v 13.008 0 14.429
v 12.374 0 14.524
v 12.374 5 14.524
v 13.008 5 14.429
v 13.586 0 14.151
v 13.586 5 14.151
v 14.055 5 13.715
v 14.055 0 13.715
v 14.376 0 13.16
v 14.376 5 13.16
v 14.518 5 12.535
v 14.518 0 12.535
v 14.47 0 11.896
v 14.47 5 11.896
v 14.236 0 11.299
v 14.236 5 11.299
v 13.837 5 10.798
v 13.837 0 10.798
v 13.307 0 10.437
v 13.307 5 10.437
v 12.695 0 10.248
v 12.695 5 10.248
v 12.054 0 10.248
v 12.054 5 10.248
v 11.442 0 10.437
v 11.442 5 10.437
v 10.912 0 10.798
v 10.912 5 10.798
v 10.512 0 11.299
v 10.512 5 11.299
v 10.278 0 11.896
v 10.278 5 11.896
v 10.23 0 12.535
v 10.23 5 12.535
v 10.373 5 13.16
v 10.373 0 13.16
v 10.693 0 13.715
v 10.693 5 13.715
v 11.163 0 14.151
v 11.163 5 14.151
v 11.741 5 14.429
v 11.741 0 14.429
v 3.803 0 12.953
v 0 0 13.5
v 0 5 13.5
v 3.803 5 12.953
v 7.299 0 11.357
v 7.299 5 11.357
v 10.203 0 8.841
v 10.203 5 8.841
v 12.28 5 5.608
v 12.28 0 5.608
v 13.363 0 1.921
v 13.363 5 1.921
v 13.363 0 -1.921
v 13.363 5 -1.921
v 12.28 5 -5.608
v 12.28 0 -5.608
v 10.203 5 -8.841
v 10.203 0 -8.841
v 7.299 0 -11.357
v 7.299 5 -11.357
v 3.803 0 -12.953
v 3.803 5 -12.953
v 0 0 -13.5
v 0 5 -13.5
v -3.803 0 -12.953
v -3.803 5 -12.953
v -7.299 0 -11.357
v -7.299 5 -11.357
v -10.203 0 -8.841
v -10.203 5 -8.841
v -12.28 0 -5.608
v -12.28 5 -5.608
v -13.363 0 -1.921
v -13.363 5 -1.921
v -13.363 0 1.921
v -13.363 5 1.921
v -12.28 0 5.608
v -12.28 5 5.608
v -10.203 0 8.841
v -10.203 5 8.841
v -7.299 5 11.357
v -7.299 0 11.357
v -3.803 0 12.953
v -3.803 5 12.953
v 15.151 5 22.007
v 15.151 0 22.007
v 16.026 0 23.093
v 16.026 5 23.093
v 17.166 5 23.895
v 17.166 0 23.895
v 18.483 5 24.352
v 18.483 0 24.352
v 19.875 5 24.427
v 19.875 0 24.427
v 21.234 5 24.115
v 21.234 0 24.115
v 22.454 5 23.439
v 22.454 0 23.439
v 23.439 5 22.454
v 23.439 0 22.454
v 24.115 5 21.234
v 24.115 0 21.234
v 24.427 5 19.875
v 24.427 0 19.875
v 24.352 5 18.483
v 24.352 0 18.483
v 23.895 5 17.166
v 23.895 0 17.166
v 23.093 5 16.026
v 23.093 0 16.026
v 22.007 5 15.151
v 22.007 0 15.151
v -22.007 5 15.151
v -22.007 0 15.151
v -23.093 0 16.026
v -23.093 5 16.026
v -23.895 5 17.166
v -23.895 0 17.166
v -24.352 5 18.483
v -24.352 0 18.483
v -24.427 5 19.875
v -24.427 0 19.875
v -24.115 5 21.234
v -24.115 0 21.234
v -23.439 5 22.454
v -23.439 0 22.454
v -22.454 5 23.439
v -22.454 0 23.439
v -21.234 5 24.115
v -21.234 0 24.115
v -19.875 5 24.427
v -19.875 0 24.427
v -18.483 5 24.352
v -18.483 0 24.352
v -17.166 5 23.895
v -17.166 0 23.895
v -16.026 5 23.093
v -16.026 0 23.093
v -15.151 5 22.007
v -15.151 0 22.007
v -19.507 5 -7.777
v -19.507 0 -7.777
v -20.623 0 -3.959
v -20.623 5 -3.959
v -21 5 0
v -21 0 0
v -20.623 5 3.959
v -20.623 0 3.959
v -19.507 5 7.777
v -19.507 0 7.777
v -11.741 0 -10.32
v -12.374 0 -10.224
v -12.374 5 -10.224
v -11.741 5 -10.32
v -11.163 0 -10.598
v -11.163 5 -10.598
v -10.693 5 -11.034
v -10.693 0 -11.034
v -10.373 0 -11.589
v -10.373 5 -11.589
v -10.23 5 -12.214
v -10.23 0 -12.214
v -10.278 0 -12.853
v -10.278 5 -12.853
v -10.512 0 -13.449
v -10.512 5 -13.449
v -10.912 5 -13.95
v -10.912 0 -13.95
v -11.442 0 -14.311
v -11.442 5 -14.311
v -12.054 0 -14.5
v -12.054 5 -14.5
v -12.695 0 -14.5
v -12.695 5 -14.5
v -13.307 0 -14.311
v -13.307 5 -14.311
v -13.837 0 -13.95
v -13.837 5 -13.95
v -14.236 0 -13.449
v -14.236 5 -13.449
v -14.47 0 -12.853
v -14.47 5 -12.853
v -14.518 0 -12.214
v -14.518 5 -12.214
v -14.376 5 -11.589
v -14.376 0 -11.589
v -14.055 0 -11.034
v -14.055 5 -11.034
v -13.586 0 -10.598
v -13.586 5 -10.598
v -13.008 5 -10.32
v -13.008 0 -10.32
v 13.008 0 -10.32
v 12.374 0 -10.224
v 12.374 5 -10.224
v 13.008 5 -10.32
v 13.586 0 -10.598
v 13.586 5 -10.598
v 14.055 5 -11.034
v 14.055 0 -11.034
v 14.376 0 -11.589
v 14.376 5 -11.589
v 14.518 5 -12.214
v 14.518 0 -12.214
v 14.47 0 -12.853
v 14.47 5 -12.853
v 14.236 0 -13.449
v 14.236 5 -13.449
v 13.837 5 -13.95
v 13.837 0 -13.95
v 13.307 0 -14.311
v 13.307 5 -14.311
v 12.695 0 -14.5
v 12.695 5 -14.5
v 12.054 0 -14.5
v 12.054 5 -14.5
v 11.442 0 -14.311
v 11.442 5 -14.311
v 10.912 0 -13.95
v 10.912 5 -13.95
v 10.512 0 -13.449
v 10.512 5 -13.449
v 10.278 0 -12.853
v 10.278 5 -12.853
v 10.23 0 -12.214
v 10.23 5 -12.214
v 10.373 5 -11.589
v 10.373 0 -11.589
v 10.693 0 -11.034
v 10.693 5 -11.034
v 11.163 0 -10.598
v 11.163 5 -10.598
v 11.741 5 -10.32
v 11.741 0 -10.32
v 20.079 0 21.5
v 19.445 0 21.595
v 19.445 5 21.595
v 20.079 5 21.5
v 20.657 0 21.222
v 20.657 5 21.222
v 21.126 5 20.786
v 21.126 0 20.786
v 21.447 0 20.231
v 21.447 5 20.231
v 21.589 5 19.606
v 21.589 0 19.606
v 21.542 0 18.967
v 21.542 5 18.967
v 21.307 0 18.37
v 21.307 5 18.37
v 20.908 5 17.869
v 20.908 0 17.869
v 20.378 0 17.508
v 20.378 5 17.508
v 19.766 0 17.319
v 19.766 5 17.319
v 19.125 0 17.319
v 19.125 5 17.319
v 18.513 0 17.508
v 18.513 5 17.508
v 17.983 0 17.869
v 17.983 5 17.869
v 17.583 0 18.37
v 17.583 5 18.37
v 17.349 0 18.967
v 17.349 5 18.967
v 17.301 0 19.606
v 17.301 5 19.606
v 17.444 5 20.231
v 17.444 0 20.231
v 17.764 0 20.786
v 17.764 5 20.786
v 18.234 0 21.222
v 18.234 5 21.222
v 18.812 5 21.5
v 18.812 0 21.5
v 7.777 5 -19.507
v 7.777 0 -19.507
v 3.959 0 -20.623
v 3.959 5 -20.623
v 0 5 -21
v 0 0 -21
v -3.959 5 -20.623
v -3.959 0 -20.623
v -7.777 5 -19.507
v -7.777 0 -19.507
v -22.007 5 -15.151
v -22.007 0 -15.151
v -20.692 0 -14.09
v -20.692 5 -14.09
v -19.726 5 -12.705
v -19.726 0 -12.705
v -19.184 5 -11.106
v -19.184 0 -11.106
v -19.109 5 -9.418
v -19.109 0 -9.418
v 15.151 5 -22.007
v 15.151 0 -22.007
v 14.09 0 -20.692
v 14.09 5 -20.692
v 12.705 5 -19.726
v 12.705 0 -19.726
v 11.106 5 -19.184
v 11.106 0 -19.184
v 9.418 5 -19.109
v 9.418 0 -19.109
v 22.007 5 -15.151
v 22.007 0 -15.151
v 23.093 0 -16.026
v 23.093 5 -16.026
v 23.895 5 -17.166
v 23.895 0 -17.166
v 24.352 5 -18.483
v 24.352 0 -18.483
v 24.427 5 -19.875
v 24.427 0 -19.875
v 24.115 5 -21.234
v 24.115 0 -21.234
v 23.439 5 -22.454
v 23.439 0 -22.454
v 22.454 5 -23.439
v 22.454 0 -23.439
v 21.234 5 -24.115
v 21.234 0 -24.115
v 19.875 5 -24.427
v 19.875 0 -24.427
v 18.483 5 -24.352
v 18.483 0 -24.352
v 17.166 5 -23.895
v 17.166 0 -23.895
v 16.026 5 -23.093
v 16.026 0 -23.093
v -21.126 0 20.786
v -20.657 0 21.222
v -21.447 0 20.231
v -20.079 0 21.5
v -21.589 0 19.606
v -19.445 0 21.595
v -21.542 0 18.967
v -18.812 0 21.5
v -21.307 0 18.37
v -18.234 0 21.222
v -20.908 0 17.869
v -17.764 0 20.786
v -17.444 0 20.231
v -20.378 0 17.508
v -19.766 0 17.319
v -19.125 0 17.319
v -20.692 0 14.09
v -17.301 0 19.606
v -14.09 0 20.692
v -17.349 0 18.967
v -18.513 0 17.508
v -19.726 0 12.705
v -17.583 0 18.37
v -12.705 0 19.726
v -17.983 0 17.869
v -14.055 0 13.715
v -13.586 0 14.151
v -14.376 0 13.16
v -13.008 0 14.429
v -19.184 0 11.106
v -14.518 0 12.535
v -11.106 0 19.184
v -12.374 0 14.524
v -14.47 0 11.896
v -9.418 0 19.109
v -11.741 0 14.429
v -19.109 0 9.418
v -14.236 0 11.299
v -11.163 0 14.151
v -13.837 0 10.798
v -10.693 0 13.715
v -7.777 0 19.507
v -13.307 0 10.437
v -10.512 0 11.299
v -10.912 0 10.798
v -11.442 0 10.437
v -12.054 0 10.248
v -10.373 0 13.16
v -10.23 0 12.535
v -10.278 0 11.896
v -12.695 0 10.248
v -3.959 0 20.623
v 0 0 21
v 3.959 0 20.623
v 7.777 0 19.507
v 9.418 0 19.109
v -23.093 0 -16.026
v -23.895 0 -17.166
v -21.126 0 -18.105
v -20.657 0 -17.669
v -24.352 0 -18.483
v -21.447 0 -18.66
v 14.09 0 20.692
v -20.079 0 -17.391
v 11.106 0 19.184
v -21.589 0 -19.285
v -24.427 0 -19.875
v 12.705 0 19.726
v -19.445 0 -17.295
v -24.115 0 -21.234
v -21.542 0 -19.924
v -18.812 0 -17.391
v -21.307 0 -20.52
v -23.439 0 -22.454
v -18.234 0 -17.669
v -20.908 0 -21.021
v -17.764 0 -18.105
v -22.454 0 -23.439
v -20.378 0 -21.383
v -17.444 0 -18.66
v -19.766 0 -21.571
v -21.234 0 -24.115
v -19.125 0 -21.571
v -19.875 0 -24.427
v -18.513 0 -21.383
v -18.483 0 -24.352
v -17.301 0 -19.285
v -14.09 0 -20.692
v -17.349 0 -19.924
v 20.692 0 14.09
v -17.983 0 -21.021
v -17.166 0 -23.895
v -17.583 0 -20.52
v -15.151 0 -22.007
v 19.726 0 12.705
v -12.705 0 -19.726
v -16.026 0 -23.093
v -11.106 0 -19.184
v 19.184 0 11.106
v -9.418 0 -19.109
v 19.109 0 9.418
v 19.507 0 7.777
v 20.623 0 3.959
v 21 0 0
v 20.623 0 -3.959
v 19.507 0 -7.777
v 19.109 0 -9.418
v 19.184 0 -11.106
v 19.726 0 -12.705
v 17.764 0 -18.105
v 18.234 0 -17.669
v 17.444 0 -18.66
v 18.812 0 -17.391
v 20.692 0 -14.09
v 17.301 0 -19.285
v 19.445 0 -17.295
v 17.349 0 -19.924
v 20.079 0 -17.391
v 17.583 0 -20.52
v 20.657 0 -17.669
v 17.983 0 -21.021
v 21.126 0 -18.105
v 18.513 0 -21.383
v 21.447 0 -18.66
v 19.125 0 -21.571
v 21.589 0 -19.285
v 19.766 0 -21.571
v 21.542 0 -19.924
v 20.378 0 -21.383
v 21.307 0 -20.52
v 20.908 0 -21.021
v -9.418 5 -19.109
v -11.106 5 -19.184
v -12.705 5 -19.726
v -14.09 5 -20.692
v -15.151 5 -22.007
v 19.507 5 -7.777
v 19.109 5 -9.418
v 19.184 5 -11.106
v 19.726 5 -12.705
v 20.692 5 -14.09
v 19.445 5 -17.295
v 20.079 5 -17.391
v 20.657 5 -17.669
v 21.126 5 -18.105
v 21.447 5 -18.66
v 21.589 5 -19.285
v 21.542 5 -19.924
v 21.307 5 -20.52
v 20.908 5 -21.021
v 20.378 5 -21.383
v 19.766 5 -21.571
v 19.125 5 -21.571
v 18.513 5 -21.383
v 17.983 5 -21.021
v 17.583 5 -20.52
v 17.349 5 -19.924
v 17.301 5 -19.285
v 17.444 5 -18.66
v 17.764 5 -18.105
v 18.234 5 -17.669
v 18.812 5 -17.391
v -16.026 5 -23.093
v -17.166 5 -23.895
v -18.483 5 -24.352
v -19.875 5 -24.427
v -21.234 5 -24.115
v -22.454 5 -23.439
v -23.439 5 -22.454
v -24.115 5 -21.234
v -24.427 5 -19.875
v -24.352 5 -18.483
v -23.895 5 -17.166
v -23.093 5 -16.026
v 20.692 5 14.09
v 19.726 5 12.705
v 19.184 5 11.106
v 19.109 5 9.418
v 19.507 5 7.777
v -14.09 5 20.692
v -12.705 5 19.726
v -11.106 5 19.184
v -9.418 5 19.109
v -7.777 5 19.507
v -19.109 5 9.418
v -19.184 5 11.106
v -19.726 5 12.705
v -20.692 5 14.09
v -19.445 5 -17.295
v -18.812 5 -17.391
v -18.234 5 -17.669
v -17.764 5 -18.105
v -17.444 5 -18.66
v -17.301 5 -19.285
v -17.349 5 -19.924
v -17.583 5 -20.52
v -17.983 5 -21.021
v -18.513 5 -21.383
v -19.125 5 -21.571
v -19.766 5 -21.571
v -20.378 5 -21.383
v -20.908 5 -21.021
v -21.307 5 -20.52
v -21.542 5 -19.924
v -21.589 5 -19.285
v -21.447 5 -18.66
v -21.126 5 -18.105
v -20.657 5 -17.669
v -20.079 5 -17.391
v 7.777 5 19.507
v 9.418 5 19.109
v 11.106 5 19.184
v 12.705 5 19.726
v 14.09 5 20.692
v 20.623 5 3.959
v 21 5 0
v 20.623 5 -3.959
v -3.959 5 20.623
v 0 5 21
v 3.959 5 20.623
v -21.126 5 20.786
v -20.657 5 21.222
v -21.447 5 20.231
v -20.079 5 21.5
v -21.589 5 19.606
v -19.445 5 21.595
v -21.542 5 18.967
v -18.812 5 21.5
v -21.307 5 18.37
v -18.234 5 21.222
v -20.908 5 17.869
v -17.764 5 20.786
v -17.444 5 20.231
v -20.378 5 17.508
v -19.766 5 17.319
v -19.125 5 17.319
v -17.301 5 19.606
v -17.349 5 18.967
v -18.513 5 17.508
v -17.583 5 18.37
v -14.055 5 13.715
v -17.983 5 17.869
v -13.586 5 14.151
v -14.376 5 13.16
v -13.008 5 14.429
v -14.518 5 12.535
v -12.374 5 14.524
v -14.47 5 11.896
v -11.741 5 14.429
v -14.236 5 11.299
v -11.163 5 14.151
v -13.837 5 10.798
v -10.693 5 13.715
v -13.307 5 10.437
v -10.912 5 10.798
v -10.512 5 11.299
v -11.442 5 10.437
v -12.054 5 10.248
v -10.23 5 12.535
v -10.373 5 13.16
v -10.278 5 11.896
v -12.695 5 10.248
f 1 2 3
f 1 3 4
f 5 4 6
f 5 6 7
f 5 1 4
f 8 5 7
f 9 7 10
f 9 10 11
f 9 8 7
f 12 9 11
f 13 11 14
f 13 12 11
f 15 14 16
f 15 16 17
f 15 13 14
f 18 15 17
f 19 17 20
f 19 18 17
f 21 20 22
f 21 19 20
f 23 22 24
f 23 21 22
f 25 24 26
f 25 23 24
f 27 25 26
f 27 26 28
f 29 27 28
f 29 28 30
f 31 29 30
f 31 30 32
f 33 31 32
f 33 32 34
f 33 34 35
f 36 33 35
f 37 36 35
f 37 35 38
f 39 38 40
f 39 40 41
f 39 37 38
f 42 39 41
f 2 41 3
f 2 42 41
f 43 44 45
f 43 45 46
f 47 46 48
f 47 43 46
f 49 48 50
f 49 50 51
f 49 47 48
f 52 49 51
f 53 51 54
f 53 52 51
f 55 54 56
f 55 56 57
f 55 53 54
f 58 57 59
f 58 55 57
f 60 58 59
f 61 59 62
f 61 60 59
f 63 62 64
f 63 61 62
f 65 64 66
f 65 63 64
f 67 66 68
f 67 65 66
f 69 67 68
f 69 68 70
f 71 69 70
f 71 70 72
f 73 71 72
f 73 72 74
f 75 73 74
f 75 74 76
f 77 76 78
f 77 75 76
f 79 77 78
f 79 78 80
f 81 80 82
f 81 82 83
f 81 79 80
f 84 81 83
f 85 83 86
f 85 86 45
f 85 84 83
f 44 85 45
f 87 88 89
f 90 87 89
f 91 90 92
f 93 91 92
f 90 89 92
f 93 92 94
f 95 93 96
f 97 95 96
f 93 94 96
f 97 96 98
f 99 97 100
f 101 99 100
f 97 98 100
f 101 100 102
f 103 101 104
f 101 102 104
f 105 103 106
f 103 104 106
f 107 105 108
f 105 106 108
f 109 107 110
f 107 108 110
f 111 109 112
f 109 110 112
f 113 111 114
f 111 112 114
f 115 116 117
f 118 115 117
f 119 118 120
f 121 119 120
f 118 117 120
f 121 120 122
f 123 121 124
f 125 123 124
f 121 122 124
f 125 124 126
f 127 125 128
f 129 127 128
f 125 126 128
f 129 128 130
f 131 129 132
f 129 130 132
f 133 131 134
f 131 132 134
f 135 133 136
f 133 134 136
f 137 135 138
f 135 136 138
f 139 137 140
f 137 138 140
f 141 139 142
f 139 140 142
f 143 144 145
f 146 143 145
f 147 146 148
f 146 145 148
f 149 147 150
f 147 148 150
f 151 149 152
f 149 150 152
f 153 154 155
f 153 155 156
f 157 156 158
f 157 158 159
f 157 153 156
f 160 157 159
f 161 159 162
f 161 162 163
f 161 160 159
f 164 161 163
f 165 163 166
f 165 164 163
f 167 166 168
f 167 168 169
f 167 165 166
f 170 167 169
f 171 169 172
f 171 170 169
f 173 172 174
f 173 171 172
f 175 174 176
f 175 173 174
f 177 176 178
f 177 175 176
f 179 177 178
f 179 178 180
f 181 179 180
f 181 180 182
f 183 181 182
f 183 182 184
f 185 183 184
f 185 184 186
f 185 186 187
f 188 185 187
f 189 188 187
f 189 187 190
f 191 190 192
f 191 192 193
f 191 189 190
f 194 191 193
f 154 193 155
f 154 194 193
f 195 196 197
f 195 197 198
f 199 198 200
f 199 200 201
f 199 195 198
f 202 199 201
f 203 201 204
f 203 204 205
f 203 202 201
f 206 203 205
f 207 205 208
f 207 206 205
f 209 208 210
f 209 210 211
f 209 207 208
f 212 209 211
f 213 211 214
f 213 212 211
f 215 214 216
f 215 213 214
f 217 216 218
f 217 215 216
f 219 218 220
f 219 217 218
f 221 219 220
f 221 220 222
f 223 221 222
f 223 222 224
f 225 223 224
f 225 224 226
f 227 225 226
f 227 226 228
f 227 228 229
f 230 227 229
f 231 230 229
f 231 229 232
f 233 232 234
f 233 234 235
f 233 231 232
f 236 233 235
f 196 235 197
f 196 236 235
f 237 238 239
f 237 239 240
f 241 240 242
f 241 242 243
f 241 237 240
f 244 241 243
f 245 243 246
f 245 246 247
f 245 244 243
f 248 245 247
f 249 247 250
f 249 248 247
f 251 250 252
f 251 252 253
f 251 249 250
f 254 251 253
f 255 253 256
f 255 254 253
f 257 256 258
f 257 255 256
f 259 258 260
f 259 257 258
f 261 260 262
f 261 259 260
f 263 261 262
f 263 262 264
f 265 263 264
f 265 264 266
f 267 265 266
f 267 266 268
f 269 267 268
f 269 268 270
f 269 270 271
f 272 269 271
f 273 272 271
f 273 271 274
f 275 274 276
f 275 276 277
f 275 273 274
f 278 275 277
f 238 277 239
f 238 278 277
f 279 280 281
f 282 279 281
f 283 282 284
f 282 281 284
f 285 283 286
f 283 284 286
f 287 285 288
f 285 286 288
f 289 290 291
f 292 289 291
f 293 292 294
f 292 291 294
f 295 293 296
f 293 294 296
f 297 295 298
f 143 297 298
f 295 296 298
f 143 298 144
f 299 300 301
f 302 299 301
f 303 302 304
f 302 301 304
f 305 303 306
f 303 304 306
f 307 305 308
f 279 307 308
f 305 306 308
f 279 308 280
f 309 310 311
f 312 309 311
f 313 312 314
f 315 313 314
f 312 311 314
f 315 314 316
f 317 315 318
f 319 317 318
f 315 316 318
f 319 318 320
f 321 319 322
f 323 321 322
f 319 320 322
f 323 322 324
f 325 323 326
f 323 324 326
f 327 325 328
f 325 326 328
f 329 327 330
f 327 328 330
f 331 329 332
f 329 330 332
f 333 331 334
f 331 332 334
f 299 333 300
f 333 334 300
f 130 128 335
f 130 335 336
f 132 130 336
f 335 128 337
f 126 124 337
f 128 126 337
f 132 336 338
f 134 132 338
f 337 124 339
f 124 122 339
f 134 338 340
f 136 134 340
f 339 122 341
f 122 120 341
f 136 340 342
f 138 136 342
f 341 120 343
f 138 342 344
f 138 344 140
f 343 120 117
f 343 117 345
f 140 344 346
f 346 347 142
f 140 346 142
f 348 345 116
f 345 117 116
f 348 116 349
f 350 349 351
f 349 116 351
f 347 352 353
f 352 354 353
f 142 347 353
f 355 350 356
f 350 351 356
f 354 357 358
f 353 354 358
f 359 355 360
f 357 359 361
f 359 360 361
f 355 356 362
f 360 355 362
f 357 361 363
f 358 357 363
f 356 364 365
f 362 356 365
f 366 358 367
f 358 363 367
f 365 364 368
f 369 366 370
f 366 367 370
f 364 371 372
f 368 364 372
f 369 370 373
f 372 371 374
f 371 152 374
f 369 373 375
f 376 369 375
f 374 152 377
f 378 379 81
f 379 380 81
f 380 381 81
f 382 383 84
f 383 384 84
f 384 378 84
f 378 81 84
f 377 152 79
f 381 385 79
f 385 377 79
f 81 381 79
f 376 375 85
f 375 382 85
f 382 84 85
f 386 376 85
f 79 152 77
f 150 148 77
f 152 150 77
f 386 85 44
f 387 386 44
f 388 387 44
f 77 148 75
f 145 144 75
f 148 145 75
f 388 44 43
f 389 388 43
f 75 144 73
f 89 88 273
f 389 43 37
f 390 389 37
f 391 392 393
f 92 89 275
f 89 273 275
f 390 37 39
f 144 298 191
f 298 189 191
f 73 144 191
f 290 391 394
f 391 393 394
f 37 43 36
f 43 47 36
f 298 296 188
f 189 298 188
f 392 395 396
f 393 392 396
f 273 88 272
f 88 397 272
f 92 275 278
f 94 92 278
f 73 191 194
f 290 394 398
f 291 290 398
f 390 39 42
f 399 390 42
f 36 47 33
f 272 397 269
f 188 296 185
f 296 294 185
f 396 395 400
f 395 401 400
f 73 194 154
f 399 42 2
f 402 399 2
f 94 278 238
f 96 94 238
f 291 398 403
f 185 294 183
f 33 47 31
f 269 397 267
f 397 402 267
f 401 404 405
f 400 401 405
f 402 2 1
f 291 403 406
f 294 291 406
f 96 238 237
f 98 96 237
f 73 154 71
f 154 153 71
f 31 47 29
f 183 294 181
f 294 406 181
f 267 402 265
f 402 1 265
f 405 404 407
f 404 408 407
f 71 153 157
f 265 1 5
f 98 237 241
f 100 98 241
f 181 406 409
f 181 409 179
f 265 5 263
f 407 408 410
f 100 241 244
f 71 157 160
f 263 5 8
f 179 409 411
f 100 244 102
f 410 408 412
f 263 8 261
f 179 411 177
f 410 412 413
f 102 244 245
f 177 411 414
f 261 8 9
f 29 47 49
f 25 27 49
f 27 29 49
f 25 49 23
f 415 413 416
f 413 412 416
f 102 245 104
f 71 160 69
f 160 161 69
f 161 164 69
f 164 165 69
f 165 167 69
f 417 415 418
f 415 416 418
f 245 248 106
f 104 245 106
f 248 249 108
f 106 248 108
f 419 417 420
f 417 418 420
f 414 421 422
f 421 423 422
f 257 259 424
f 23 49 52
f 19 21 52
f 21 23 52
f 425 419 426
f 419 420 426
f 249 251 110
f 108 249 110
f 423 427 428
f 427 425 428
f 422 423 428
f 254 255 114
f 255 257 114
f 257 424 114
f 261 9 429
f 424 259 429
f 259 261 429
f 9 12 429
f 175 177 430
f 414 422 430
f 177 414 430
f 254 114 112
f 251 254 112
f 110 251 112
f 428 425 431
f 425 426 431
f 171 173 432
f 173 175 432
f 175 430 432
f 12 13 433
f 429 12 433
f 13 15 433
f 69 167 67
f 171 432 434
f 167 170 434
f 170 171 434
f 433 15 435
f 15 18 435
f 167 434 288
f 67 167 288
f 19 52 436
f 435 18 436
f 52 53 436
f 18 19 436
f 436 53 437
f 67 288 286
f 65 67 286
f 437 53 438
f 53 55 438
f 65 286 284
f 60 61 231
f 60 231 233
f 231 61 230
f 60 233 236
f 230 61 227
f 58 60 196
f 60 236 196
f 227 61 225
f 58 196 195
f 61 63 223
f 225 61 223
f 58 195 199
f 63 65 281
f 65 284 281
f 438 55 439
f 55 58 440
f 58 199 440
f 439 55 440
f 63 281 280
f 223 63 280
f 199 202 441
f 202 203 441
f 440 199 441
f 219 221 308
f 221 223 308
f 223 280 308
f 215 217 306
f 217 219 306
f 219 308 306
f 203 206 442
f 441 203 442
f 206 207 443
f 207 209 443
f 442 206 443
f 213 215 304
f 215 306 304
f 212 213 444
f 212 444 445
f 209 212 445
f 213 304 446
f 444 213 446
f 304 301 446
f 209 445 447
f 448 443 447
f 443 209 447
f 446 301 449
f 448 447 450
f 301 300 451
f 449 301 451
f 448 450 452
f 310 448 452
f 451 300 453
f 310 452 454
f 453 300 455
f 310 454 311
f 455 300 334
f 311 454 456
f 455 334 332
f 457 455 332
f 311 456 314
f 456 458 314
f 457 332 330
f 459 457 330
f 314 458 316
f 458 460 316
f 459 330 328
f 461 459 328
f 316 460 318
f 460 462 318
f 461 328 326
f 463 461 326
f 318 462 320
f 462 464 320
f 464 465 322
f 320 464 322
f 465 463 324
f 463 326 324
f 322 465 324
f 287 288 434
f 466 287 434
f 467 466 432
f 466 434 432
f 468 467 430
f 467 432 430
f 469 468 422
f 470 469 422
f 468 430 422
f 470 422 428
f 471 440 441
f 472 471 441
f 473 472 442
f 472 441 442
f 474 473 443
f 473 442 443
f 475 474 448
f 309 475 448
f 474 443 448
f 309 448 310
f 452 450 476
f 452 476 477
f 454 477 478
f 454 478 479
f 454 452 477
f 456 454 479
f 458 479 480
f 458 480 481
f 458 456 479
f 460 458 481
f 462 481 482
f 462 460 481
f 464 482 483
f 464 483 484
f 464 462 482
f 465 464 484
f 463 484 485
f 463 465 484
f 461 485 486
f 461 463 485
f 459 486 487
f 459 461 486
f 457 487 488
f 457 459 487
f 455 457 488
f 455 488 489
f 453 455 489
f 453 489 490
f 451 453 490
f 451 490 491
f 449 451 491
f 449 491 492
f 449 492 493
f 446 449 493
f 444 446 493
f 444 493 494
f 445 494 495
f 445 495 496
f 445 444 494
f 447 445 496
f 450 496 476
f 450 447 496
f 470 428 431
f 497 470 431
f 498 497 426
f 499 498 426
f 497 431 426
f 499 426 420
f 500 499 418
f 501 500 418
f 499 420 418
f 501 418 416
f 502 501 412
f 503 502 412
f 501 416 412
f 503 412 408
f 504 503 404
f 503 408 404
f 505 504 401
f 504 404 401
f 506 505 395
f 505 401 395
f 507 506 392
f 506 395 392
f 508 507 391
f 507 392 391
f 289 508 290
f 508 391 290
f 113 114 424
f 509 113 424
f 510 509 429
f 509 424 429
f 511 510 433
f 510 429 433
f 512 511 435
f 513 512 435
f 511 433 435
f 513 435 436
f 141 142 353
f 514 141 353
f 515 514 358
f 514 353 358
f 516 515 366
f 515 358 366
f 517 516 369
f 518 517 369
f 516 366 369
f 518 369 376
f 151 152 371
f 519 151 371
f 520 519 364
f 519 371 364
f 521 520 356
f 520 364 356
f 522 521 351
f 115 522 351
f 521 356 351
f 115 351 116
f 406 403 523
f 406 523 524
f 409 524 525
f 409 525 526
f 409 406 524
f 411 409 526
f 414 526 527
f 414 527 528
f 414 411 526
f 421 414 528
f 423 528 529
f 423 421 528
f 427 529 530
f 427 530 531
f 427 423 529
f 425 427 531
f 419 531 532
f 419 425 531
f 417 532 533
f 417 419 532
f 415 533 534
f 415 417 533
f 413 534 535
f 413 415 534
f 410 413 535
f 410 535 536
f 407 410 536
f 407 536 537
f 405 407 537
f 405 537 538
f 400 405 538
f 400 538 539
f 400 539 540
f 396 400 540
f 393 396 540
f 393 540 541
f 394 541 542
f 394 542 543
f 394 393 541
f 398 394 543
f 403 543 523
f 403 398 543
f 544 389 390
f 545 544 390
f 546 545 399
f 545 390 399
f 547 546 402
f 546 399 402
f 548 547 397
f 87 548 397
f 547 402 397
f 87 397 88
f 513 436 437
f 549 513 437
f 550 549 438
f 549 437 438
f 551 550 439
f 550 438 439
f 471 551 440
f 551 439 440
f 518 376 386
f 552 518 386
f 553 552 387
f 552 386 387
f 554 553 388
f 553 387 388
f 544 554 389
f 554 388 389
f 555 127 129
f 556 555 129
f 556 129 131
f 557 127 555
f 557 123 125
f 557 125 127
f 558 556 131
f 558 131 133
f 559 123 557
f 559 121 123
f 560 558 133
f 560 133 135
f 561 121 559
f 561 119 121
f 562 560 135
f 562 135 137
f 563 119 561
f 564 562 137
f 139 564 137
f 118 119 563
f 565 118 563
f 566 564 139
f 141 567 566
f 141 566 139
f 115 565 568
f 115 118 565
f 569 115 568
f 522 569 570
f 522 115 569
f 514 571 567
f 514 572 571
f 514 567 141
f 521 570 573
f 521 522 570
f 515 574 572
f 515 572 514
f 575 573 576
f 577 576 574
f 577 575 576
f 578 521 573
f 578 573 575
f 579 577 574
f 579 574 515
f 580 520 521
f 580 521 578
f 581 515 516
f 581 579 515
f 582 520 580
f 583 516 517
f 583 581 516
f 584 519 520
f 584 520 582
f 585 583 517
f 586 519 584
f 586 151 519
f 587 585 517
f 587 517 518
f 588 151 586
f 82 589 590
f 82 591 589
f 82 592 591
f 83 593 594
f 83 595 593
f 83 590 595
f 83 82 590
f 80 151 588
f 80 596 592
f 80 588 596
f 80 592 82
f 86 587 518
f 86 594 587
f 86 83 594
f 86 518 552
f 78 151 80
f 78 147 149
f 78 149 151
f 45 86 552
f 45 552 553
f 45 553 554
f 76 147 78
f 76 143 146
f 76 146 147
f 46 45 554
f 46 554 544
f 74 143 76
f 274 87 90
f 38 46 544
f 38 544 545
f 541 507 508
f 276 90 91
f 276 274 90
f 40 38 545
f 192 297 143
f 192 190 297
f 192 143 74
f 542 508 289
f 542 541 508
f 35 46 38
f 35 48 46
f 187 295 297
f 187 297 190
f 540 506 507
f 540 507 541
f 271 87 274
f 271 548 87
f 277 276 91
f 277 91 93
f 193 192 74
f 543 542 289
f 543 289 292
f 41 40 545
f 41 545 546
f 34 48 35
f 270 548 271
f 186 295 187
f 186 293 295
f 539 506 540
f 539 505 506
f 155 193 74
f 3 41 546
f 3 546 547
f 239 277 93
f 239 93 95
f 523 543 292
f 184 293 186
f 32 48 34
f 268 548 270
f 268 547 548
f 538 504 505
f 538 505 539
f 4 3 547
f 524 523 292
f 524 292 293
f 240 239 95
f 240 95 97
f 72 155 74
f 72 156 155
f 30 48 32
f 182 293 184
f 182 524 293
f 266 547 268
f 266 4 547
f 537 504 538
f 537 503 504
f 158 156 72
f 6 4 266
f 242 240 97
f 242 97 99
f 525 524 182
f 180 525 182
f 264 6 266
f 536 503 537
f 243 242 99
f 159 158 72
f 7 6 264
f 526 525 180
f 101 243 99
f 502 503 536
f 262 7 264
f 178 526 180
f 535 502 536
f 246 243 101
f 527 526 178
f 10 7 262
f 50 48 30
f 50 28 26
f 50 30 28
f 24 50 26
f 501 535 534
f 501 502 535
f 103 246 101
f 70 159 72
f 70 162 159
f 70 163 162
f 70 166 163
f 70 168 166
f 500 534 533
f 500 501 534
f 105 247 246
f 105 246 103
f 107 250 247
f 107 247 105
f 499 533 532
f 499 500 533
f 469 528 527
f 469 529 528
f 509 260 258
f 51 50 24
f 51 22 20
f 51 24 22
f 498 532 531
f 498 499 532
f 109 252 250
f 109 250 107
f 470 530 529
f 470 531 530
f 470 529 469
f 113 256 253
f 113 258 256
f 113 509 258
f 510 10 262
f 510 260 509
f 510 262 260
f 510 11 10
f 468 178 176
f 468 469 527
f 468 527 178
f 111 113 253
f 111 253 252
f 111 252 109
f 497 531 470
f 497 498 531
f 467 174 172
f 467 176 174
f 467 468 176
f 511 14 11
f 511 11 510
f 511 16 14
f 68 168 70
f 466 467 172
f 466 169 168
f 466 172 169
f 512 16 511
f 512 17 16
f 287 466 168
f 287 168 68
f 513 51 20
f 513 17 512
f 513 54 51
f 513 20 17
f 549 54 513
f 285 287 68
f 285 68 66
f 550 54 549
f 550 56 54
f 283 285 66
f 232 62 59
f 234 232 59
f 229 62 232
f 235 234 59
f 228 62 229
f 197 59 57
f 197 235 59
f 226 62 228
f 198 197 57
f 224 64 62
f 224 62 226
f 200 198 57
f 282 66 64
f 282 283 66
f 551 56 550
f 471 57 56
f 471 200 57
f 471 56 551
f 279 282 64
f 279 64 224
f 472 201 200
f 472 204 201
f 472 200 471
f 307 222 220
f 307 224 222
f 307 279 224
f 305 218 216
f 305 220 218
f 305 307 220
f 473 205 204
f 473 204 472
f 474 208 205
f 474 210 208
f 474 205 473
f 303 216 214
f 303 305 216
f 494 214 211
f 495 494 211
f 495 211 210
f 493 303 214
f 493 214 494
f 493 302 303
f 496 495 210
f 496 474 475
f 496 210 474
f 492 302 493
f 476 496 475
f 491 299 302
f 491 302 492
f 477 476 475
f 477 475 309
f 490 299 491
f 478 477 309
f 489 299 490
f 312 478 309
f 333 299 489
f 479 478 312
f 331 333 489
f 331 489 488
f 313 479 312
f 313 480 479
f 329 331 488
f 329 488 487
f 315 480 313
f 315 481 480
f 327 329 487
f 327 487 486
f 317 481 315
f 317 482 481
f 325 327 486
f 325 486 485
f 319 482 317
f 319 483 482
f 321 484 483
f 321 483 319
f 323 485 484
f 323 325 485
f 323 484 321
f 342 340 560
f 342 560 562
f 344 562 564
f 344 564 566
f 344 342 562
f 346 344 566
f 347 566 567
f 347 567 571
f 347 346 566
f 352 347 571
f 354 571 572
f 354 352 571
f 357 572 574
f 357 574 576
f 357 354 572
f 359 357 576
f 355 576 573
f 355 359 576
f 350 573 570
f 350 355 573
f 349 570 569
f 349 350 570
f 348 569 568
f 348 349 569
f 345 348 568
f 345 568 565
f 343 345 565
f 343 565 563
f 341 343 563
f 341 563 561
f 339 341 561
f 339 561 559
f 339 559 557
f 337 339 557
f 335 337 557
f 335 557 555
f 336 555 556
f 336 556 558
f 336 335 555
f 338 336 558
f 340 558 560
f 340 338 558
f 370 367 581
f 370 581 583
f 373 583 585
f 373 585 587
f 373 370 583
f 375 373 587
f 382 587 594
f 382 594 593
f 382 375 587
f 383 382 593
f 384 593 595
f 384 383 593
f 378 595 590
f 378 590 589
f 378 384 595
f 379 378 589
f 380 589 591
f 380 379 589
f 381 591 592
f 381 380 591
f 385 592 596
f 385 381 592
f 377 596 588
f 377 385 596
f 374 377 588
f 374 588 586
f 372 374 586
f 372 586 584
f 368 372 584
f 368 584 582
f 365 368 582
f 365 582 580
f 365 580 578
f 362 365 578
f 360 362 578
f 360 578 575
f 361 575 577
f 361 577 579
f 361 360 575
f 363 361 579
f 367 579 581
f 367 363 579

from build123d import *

# Parameters (mm, degrees)
SKETCH_1_R      = 13.5
SKETCH_1_R_2    = 2.15
EXTRUDE_1_DEPTH = 5


with BuildPart() as part:
    # ｽｹｯﾁ1 → ﾎﾞｽ - 押し出し1 (new body)
    with BuildSketch(Plane(origin=(0, 0, 0), x_dir=(1, 0, 0), z_dir=(0, 1, 0))):
        with BuildLine():
            ThreePointArc((19.507056212, -7.776551803), (21, 0), (19.507056212, 7.776551803))
            ThreePointArc((19.507056212, 7.776551803), (19.398069264, 11.924552334), (22.006829374, 15.151339784))
            ThreePointArc((22.006829374, 15.151339784), (22.980970389, 22.980970389), (15.151339784, 22.006829374))
            ThreePointArc((15.151339784, 22.006829374), (11.924552334, 19.398069264), (7.776551803, 19.507056212))
            ThreePointArc((7.776551803, 19.507056212), (0, 21), (-7.776551803, 19.507056212))
            ThreePointArc((-7.776551803, 19.507056212), (-11.924552334, 19.398069264), (-15.151339784, 22.006829374))
            ThreePointArc((-15.151339784, 22.006829374), (-22.980970389, 22.980970389), (-22.006829374, 15.151339784))
            ThreePointArc((-22.006829374, 15.151339784), (-19.398069264, 11.924552334), (-19.507056212, 7.776551803))
            ThreePointArc((-19.507056212, 7.776551803), (-21, 0), (-19.507056212, -7.776551803))
            ThreePointArc((-19.507056212, -7.776551803), (-19.398069264, -11.924552334), (-22.006829374, -15.151339784))
            ThreePointArc((-22.006829374, -15.151339784), (-22.980970389, -22.980970389), (-15.151339784, -22.006829374))
            ThreePointArc((-15.151339784, -22.006829374), (-11.924552334, -19.398069264), (-7.776551803, -19.507056212))
            ThreePointArc((-7.776551803, -19.507056212), (0, -21), (7.776551803, -19.507056212))
            ThreePointArc((7.776551803, -19.507056212), (11.924552334, -19.398069264), (15.151339784, -22.006829374))
            ThreePointArc((15.151339784, -22.006829374), (22.980970389, -22.980970389), (22.006829374, -15.151339784))
            ThreePointArc((22.006829374, -15.151339784), (19.398069264, -11.924552334), (19.507056212, -7.776551803))
        make_face()
        with Locations(Location((0, 0, 0), (0, 0, 270))):
            Circle(SKETCH_1_R, mode=Mode.SUBTRACT)
        with Locations(Location((12.374368671, 12.374368671, 0), (0, 0, 270))):
            Circle(SKETCH_1_R_2, mode=Mode.SUBTRACT)
        with Locations(Location((12.374368671, -12.374368671, 0), (0, 0, 270))):
            Circle(SKETCH_1_R_2, mode=Mode.SUBTRACT)
        with Locations(Location((-12.374368671, -12.374368671, 0), (0, 0, 270))):
            Circle(SKETCH_1_R_2, mode=Mode.SUBTRACT)
        with Locations(Location((-12.374368671, 12.374368671, 0), (0, 0, 270))):
            Circle(SKETCH_1_R_2, mode=Mode.SUBTRACT)
        with Locations(Location((19.445436483, 19.445436483, 0), (0, 0, 270))):
            Circle(SKETCH_1_R_2, mode=Mode.SUBTRACT)
        with Locations(Location((19.445436483, -19.445436483, 0), (0, 0, 270))):
            Circle(SKETCH_1_R_2, mode=Mode.SUBTRACT)
        with Locations(Location((-19.445436483, -19.445436483, 0), (0, 0, 270))):
            Circle(SKETCH_1_R_2, mode=Mode.SUBTRACT)
        with Locations(Location((-19.445436483, 19.445436483, 0), (0, 0, 270))):
            Circle(SKETCH_1_R_2, mode=Mode.SUBTRACT)
    extrude(amount=EXTRUDE_1_DEPTH)


solid = part.part
